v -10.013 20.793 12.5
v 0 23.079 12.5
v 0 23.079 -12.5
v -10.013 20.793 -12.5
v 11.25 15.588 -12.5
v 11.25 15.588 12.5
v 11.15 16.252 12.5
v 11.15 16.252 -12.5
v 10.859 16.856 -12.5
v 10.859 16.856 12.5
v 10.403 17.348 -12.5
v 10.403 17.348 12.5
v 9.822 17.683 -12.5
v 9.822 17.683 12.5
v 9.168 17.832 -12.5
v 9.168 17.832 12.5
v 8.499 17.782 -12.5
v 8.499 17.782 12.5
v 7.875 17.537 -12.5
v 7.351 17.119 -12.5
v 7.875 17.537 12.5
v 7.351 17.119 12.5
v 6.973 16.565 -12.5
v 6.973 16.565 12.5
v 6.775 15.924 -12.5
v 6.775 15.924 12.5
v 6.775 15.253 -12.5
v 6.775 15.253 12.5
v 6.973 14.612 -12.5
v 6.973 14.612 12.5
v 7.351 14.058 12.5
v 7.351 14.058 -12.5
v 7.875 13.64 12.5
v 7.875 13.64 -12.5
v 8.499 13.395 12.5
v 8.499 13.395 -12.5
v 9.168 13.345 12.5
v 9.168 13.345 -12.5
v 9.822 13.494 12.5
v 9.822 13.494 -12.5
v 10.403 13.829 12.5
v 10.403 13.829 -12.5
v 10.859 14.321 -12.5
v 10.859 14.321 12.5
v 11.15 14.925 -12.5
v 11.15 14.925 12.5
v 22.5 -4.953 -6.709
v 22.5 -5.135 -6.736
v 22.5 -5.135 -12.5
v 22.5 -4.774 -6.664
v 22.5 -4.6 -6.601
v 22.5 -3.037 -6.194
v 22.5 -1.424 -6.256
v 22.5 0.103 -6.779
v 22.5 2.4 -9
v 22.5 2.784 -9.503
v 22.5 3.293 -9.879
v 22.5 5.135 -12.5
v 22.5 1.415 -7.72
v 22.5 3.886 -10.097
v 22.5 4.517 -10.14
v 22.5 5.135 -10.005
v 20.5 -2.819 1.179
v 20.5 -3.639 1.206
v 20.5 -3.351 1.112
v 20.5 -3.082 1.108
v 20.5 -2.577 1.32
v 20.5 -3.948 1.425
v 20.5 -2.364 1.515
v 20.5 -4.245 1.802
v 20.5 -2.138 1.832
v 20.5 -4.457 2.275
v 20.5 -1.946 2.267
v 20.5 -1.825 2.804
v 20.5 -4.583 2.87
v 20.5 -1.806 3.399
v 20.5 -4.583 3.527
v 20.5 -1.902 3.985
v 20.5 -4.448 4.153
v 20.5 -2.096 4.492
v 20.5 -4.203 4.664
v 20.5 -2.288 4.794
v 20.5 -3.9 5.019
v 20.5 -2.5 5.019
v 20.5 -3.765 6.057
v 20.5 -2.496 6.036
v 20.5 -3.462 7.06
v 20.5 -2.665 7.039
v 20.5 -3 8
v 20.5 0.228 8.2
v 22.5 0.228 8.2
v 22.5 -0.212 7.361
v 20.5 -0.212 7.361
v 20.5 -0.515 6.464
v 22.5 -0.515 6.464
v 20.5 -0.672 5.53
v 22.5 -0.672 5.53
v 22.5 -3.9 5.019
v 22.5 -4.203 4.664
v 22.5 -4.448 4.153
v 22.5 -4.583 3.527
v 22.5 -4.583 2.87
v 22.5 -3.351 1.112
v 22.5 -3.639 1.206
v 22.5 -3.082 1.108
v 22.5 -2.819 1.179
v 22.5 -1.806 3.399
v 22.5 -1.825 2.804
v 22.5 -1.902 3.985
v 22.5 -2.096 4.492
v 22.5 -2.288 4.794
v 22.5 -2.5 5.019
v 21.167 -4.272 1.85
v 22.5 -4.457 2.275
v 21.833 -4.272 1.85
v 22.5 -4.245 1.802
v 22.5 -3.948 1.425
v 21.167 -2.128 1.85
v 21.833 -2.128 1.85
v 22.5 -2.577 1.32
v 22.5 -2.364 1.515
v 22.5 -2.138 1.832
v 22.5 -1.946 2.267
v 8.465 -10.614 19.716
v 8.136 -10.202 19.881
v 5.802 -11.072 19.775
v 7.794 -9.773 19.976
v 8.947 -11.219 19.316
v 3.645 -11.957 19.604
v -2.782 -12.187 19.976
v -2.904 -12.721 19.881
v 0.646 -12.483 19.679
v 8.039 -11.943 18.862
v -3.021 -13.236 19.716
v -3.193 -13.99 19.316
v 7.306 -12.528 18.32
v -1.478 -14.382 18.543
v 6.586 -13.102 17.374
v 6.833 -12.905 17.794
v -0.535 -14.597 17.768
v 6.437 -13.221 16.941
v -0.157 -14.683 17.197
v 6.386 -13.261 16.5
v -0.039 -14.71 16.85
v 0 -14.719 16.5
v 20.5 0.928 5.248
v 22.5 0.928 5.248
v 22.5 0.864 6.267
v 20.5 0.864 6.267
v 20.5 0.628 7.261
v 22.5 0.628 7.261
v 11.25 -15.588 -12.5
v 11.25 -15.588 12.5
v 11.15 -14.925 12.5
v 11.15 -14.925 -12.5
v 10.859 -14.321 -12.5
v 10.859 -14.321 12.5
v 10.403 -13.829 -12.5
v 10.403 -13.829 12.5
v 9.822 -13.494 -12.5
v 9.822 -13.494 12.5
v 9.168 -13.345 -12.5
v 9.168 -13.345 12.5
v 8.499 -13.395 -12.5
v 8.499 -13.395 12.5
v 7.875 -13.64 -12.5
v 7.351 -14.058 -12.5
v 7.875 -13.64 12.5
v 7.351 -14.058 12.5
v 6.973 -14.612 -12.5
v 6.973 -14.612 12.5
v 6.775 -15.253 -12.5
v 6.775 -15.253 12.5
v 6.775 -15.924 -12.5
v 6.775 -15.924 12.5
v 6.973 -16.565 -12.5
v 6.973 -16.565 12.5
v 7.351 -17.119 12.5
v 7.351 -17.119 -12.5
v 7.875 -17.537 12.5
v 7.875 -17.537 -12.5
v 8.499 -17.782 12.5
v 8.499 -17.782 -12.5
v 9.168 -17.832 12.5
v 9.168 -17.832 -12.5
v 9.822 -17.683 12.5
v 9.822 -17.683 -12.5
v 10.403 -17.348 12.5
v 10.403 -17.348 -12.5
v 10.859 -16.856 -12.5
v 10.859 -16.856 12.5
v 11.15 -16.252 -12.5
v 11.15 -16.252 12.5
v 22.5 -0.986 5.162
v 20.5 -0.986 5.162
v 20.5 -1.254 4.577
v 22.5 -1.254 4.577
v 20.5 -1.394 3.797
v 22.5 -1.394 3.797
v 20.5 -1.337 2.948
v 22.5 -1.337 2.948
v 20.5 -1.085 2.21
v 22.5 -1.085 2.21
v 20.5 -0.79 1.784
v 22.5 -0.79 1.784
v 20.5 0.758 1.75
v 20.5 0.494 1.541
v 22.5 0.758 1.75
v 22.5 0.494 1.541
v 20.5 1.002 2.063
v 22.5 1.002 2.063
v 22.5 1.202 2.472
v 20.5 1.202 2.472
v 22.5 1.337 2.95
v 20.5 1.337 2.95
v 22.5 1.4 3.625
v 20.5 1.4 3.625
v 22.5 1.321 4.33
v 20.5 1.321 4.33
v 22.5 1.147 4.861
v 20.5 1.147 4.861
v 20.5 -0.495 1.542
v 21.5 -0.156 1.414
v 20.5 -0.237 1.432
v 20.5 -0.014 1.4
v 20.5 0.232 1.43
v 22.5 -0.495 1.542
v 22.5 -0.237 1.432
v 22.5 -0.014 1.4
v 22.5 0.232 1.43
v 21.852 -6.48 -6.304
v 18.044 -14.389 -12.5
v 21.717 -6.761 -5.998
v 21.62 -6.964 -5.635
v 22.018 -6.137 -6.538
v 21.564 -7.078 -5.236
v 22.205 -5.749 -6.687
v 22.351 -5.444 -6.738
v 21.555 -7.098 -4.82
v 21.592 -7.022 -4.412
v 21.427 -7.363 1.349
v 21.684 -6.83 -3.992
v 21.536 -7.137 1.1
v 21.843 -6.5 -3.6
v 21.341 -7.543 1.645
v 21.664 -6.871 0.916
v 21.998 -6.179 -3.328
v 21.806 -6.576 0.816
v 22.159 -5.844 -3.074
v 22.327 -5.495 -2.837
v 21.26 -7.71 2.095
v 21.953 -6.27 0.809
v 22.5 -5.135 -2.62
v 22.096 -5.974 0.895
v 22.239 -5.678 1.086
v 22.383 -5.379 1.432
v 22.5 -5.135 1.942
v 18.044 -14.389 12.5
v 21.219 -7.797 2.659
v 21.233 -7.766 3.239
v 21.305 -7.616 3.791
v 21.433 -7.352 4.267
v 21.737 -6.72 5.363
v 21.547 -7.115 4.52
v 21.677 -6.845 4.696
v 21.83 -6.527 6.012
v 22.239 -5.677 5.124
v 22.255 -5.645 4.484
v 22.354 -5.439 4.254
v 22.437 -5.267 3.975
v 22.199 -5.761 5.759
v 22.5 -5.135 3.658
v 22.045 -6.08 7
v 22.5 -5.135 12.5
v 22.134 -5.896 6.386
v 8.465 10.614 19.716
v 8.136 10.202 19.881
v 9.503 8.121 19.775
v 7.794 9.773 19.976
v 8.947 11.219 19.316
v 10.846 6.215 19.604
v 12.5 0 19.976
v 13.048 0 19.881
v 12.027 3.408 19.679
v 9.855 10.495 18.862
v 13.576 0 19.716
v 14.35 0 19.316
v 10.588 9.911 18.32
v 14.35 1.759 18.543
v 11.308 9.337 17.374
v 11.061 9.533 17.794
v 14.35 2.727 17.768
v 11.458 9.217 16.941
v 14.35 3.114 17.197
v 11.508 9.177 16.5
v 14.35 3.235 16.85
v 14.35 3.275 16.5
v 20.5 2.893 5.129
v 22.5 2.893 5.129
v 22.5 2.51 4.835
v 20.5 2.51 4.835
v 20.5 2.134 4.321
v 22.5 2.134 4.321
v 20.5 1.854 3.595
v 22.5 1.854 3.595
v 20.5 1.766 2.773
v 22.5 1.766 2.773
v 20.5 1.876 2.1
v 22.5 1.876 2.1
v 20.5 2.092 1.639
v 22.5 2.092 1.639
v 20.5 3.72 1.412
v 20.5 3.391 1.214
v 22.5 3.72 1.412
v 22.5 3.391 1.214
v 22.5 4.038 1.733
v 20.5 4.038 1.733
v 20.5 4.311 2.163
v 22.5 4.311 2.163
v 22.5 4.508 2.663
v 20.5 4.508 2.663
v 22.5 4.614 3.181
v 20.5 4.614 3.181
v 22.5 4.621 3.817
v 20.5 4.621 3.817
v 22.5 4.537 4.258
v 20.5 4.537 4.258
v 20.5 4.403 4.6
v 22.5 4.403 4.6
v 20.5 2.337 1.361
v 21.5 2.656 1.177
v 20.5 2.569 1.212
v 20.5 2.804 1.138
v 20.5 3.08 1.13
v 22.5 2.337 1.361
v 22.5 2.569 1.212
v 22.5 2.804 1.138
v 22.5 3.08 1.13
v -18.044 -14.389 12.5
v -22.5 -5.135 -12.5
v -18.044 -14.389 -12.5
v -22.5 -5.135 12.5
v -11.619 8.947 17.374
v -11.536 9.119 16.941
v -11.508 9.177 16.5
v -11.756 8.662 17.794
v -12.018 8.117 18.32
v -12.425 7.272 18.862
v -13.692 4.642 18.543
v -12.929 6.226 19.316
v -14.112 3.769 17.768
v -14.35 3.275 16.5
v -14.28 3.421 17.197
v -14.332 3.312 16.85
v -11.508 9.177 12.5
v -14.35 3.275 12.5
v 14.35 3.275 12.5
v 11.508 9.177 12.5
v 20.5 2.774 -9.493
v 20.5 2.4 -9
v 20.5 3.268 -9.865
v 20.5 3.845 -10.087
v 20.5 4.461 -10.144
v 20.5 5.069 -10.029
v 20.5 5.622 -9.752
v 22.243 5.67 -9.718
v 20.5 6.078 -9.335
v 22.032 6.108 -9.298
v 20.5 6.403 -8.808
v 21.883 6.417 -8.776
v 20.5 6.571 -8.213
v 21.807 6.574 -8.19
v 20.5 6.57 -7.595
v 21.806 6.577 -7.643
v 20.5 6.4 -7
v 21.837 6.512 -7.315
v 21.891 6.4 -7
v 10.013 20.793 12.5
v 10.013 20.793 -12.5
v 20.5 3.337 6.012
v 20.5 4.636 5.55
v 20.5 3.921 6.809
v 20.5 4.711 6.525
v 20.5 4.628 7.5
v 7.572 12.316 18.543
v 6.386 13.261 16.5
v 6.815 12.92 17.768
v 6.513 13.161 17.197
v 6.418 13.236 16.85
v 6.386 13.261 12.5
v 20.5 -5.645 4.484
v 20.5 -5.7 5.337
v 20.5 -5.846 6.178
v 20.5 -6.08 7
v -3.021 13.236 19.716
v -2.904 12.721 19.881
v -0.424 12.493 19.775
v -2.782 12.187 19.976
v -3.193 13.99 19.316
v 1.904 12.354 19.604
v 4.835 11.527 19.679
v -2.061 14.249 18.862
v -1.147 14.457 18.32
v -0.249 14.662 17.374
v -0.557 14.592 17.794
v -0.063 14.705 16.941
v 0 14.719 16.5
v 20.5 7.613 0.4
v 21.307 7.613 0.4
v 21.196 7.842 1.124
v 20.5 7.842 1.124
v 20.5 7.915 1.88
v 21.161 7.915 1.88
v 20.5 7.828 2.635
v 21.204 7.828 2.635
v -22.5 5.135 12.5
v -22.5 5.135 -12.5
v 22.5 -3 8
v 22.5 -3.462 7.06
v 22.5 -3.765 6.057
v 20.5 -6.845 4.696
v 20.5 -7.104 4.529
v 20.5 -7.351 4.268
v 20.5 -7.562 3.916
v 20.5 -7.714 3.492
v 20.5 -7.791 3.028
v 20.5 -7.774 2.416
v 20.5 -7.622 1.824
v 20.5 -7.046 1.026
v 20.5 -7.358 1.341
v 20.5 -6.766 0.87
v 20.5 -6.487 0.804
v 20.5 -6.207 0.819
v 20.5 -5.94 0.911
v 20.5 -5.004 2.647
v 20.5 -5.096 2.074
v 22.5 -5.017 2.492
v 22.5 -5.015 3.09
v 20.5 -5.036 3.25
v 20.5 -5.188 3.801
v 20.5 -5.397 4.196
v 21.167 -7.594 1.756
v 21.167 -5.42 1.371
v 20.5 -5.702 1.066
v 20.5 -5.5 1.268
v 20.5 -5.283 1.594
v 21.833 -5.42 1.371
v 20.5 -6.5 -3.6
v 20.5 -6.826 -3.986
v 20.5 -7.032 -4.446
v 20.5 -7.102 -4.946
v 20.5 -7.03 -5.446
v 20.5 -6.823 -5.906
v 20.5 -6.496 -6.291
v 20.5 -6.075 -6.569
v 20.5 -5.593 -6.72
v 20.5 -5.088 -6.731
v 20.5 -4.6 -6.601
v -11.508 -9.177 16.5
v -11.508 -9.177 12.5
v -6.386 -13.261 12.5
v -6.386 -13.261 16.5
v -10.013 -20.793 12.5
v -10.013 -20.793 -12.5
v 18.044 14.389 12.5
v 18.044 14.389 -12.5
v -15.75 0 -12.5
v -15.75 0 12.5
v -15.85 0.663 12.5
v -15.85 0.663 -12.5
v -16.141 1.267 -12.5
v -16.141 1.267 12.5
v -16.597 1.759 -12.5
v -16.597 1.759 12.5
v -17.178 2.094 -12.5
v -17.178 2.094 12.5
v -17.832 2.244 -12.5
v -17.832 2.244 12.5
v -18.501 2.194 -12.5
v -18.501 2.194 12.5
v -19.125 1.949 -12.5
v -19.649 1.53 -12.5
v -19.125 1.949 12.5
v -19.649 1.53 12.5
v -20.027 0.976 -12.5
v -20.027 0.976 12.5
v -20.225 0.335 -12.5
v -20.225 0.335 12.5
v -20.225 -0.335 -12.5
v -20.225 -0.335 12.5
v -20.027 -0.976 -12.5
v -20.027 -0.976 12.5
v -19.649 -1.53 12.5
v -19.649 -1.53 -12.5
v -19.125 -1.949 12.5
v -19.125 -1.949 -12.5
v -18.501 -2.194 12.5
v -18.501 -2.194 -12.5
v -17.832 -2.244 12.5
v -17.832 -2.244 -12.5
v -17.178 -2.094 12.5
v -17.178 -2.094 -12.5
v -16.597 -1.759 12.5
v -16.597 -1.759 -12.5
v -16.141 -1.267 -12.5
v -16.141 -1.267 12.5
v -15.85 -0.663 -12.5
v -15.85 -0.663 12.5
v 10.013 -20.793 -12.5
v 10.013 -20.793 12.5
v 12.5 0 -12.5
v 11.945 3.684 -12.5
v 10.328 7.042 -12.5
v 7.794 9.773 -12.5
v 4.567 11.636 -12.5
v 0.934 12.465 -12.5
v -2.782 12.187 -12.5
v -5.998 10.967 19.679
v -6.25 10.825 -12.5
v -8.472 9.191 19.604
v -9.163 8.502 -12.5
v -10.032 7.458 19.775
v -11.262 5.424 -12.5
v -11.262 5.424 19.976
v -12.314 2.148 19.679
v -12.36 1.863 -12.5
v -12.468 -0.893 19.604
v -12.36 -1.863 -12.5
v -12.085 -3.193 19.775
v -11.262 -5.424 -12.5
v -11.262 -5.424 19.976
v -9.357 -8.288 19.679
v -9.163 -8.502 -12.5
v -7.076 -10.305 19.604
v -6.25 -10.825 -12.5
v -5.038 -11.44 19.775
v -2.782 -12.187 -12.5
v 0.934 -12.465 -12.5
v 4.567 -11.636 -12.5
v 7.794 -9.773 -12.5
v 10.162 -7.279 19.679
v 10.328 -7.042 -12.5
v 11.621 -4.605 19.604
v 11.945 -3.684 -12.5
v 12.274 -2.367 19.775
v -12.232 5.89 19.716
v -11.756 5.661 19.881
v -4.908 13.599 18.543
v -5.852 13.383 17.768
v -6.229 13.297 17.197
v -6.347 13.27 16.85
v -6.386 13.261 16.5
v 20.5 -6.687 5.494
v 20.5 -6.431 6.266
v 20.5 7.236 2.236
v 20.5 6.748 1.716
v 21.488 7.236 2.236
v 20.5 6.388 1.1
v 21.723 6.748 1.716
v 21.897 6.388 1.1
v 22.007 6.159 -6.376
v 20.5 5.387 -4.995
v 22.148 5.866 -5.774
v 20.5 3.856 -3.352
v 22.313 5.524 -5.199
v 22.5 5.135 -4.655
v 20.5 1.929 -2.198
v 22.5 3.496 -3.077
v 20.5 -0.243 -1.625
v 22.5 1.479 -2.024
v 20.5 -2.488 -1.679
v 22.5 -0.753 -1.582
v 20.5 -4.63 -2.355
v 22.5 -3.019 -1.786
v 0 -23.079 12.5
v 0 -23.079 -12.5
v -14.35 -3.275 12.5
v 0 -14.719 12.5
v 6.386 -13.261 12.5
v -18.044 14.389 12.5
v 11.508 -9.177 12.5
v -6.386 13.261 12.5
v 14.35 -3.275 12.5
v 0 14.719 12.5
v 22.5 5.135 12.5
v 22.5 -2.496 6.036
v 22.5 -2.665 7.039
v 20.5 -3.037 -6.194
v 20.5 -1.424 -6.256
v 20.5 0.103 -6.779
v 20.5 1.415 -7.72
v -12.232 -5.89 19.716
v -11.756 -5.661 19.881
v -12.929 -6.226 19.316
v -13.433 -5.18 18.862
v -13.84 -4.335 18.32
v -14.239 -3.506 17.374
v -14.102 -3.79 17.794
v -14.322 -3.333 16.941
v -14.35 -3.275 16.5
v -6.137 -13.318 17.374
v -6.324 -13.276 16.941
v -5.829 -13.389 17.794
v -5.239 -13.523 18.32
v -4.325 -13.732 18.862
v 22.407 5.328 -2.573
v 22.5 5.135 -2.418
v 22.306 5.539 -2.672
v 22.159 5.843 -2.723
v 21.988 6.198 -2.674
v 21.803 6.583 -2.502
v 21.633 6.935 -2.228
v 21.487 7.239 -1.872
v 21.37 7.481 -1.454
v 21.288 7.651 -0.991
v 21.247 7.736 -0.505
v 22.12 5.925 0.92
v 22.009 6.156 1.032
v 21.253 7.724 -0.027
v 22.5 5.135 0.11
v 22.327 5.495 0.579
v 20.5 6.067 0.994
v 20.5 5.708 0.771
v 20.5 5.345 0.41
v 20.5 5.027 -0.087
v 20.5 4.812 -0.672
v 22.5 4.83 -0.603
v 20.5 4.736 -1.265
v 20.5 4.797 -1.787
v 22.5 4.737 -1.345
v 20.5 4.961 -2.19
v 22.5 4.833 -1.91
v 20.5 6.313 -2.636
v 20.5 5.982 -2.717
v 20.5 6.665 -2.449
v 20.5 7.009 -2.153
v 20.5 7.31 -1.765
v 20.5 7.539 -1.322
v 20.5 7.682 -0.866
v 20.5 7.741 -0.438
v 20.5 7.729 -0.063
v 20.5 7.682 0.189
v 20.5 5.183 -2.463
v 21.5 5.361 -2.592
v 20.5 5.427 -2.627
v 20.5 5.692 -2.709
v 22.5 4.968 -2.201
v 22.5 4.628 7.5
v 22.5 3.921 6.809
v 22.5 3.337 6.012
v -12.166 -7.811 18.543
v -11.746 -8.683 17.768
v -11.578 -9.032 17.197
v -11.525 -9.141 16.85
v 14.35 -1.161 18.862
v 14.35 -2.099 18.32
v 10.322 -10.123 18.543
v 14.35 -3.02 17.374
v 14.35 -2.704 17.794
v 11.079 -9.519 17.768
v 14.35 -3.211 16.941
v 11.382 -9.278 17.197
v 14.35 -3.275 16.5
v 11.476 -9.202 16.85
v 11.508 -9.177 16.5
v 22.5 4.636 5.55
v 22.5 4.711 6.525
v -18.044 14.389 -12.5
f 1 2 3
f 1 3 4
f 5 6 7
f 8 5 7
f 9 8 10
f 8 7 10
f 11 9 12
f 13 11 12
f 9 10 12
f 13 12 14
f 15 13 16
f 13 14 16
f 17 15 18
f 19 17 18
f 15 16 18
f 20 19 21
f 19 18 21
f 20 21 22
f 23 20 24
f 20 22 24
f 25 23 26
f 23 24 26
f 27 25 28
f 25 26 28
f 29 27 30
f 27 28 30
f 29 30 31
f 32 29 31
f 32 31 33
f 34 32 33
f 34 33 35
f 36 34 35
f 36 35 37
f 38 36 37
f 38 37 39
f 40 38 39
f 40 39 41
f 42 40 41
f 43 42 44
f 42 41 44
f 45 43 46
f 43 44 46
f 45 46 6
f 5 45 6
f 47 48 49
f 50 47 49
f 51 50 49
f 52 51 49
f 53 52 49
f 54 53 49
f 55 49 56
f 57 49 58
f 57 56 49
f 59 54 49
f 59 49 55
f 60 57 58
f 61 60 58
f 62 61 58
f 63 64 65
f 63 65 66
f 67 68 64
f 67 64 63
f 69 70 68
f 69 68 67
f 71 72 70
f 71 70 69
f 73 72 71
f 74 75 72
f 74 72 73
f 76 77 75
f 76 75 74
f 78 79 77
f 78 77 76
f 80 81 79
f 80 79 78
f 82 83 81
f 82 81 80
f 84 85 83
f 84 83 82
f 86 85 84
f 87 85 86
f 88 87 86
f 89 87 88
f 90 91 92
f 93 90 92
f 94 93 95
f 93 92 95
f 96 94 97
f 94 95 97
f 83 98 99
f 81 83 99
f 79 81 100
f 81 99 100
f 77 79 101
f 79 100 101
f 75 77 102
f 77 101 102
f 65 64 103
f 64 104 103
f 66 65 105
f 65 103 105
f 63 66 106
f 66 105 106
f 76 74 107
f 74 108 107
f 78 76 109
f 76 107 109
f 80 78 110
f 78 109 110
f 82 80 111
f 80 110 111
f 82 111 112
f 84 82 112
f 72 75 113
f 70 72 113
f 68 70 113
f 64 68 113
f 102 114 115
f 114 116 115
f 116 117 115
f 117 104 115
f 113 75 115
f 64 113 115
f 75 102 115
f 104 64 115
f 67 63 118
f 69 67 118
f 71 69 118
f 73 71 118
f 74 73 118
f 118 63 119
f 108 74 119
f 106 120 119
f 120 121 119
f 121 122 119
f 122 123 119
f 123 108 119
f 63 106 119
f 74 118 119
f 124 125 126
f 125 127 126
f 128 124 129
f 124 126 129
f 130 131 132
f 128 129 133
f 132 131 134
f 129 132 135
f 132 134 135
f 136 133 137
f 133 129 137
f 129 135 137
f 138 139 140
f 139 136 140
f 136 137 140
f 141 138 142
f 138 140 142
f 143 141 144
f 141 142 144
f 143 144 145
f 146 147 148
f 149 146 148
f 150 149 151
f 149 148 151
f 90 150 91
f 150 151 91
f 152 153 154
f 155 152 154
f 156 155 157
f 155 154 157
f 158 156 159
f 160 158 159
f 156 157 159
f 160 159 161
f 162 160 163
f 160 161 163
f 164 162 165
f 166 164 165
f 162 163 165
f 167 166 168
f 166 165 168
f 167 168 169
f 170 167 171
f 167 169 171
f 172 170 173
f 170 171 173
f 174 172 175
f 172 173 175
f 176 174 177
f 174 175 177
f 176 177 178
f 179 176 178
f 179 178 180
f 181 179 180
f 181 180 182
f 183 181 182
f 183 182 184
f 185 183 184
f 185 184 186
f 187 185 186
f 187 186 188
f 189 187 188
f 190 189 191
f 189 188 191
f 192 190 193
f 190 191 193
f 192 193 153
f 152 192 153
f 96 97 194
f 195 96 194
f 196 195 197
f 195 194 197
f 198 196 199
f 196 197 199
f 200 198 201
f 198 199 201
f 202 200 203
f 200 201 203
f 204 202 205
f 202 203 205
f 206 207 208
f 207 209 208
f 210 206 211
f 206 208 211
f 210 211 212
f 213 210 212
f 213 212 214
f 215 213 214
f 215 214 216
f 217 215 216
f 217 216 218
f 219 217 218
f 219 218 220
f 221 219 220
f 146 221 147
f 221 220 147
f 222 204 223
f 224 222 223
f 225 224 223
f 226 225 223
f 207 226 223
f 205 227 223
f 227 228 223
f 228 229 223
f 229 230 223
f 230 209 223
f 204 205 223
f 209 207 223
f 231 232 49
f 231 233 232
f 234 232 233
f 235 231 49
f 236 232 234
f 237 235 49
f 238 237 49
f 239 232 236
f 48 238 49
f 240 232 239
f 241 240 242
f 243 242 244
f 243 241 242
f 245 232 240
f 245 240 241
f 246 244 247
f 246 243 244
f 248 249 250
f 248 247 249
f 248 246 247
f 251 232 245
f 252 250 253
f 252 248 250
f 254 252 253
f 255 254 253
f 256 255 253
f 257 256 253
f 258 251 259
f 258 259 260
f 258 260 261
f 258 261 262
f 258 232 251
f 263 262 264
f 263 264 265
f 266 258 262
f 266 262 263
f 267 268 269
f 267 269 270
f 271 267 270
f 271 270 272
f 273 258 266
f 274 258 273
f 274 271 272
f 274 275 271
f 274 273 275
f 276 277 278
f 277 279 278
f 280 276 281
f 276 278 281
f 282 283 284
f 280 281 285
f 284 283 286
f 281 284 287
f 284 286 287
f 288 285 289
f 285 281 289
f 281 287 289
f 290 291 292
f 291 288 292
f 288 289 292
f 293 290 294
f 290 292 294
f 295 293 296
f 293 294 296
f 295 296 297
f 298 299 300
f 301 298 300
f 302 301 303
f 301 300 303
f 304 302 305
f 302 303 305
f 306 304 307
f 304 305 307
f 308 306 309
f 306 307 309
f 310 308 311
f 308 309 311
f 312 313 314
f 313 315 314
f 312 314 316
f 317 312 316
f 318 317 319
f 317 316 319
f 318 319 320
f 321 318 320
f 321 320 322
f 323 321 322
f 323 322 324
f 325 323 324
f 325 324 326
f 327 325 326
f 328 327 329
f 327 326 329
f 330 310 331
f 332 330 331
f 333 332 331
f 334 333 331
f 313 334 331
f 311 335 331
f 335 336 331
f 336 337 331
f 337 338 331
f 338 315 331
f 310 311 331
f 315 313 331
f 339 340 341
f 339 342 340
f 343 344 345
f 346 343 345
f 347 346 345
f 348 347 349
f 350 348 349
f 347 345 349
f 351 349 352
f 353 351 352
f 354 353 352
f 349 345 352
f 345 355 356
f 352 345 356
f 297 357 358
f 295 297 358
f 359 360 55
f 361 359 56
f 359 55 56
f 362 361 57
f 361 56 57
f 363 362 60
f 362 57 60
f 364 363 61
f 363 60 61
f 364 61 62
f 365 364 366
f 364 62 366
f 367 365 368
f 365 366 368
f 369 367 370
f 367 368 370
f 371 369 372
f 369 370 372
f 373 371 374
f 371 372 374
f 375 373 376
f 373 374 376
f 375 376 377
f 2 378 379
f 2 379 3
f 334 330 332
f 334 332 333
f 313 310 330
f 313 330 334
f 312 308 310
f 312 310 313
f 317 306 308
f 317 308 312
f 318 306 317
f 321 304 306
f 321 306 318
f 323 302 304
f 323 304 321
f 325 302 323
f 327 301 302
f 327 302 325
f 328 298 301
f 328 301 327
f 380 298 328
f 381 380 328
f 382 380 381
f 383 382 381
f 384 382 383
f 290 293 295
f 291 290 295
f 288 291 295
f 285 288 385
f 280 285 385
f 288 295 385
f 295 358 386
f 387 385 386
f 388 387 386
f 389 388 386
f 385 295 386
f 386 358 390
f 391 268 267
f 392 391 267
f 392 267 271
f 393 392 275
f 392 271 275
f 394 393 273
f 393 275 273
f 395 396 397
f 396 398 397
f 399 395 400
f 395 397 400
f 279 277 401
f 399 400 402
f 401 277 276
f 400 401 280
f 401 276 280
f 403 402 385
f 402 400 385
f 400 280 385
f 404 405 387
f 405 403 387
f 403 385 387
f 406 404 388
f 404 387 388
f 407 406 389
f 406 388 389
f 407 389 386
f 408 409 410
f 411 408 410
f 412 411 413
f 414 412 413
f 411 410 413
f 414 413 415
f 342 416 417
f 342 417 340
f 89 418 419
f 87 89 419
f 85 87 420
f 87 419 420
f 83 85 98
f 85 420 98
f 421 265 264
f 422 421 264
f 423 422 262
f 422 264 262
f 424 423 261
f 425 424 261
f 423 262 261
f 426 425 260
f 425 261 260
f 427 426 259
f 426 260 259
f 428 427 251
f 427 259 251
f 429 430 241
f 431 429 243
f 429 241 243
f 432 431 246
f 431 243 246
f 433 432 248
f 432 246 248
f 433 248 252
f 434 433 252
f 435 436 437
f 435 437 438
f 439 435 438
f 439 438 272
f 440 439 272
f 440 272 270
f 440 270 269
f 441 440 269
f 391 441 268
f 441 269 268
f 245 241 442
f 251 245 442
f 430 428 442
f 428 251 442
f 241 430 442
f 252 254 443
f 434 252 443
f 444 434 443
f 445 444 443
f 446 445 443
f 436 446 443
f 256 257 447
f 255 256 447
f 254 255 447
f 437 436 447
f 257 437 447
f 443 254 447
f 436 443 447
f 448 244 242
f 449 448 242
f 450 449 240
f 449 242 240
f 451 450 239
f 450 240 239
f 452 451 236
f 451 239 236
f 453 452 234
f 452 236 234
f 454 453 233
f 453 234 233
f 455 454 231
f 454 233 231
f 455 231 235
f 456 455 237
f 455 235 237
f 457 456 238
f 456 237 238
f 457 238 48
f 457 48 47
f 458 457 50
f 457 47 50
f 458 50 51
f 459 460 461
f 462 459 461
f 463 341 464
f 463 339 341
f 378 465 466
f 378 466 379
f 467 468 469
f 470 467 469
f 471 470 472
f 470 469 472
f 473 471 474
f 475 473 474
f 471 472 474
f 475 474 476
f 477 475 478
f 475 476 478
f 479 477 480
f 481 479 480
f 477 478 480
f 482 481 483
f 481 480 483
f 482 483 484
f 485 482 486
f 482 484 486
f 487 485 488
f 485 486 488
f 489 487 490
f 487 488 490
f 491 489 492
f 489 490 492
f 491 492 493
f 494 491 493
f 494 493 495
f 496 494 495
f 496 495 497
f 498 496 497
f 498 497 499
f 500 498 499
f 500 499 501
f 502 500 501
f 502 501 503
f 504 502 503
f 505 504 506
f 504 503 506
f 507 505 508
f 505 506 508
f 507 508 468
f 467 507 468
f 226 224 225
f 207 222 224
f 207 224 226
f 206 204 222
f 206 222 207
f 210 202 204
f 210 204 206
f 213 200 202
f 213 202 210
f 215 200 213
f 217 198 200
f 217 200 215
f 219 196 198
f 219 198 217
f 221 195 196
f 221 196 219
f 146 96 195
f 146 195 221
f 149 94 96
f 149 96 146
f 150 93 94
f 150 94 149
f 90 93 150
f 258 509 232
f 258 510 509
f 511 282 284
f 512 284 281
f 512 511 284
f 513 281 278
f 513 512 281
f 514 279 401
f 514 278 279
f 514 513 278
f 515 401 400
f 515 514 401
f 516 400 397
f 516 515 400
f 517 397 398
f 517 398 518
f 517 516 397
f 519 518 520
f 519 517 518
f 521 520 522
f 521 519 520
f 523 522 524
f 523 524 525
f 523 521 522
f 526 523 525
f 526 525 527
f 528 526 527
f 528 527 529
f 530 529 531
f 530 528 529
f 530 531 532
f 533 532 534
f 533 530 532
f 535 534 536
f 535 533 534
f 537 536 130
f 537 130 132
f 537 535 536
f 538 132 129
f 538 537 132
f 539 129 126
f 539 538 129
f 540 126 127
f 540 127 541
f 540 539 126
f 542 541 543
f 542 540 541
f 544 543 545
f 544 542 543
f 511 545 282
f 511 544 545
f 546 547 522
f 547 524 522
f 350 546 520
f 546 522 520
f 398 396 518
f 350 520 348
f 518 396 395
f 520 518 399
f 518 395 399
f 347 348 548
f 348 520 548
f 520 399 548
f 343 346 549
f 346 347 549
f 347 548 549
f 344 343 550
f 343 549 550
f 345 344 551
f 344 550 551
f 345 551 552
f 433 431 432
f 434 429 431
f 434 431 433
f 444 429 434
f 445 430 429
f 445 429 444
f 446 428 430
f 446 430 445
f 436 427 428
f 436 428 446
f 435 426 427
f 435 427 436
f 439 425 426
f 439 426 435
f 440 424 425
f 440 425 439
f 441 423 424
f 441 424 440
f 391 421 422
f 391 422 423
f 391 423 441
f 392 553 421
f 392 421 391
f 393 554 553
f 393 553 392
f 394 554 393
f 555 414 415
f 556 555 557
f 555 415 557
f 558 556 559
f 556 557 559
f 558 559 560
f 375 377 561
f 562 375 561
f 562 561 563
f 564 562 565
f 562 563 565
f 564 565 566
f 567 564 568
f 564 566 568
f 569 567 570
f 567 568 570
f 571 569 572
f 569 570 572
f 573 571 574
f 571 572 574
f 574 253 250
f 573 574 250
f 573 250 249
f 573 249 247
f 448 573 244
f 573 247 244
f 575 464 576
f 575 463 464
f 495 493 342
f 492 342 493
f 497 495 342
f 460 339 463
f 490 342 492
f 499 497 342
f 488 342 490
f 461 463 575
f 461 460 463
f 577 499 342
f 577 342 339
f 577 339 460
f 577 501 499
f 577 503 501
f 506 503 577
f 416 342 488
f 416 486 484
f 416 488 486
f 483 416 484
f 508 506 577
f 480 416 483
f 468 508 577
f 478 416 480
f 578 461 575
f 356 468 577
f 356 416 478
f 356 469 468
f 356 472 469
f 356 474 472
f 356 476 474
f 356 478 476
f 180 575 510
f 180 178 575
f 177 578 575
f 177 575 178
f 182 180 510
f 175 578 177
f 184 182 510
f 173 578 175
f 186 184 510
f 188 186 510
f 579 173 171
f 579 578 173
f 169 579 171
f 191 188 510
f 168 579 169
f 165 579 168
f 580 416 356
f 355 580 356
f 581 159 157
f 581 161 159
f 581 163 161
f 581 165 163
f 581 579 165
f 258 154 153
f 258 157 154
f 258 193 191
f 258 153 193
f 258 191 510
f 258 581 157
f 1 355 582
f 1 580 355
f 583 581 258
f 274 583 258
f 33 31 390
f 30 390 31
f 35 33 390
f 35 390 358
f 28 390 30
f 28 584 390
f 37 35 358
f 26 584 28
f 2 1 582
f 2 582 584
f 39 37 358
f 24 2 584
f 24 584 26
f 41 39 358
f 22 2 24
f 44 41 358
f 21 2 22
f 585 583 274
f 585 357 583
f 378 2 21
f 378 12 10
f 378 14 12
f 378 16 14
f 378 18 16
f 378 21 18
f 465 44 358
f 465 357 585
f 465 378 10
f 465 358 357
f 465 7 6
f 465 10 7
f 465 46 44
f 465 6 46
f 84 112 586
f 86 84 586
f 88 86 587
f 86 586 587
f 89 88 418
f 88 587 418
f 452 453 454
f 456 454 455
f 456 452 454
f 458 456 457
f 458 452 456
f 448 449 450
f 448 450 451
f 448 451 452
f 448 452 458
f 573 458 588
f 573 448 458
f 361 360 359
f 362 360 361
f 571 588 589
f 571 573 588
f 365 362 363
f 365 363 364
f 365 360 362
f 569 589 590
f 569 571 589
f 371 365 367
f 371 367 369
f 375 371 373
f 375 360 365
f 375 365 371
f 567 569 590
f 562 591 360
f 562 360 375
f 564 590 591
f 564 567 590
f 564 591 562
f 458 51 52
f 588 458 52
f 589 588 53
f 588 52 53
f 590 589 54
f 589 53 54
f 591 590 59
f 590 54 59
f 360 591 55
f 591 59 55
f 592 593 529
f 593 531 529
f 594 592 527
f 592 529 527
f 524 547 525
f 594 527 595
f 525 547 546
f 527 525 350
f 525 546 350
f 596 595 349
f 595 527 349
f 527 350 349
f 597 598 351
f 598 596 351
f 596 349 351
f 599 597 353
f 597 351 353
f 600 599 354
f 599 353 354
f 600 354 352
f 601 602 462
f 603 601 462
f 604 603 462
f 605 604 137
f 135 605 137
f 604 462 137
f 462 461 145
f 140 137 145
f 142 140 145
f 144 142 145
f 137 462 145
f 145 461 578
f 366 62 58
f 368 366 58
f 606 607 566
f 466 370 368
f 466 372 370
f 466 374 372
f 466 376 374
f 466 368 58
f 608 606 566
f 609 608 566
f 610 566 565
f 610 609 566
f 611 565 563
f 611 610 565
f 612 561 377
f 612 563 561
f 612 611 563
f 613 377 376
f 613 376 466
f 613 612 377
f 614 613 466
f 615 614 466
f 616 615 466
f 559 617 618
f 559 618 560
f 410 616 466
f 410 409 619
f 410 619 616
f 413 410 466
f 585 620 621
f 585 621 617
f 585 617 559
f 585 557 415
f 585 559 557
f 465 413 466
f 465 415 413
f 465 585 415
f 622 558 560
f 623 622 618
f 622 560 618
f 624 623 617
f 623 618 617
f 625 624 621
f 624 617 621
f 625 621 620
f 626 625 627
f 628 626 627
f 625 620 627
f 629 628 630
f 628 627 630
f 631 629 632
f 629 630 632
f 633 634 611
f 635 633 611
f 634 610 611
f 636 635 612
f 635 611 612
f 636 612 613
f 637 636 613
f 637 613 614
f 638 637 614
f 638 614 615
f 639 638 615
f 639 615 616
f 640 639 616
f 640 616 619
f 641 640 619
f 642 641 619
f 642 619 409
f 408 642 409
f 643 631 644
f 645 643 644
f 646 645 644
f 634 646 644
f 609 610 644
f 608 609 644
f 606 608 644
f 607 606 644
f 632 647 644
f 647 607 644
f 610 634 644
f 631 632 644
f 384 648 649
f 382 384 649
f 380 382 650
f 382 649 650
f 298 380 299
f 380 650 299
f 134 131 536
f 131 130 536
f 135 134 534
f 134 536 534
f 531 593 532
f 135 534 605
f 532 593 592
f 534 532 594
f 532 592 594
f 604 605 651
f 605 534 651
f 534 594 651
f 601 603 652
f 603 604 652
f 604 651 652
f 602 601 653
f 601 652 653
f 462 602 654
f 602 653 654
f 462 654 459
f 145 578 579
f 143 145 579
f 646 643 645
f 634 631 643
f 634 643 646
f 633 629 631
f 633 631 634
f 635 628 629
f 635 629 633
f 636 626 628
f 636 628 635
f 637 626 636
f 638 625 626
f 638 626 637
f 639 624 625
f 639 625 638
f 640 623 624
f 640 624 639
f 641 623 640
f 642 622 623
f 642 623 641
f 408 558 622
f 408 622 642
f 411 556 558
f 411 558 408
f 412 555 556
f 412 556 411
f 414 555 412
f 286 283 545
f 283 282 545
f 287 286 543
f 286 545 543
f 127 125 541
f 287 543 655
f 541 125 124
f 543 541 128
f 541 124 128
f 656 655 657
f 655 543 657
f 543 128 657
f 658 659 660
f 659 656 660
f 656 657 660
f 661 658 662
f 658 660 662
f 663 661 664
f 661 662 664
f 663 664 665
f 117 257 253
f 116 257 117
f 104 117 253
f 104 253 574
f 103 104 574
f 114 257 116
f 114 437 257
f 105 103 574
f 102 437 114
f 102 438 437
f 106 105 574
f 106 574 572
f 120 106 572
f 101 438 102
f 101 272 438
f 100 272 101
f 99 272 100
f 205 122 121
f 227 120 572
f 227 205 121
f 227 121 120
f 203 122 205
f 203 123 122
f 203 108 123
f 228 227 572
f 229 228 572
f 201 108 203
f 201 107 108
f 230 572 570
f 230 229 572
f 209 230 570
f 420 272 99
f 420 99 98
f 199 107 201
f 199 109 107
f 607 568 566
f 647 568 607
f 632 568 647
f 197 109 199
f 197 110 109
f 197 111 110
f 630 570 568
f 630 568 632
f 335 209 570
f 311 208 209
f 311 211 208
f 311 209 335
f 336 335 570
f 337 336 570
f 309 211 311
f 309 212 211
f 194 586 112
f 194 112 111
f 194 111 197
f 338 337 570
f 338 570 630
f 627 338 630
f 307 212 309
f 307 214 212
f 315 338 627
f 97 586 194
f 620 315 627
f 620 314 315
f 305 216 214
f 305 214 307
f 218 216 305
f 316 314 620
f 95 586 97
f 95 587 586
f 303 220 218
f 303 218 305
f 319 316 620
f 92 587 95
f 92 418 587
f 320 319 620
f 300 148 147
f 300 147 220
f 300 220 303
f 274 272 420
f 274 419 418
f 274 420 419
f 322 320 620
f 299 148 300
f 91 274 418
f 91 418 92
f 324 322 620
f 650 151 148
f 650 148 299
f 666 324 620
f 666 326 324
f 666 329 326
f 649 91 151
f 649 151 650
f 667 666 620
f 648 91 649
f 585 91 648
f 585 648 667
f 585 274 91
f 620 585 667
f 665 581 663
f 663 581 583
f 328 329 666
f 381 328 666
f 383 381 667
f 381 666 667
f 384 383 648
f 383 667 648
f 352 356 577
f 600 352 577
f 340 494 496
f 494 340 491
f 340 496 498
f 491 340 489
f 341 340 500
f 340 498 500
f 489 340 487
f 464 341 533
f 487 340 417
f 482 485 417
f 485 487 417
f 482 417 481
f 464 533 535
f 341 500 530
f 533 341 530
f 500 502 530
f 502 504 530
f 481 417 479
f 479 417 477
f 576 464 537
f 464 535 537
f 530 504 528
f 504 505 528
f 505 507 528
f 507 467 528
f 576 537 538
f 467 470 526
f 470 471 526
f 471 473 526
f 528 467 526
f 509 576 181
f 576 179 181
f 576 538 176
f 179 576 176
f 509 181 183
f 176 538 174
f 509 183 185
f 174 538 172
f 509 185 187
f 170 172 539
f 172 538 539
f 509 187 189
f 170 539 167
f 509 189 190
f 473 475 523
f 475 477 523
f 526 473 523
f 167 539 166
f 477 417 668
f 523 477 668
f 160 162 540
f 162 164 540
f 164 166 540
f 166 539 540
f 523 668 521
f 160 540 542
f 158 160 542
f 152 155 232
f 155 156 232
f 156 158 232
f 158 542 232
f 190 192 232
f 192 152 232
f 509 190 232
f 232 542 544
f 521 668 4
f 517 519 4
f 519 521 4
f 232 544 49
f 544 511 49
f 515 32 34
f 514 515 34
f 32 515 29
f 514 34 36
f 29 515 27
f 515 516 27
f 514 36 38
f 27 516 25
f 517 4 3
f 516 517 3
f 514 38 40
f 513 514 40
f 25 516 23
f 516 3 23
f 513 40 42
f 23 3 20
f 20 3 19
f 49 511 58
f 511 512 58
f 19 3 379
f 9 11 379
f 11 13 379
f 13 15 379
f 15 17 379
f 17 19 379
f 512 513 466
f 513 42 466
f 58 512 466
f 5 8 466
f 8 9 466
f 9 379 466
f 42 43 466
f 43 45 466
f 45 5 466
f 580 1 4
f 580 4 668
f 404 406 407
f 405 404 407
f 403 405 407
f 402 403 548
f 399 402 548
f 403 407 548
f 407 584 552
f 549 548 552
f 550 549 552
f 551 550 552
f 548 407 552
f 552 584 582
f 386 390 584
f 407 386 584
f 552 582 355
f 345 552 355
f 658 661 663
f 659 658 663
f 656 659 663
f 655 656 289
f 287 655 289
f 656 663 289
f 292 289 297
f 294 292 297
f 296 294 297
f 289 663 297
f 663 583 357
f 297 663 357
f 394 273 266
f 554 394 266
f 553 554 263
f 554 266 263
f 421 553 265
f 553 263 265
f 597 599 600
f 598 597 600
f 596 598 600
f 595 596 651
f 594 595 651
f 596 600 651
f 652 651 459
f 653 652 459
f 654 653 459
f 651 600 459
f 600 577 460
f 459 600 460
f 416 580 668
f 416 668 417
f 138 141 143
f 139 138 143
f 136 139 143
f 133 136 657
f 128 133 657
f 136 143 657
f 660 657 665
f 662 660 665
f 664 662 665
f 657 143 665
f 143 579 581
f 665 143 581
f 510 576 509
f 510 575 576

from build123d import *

# Parameters (mm, degrees)
F0_R         = 12.5
F1_DEPTH     = 12.5
F2_R         = 2.25
F3_DEPTH     = 25
F4_R         = 12.5
F5_DEPTH     = 7.5
F6_T1_DEPTH  = 24.050587715
F6_T3_DEPTH  = 24.050587715
F6_T5_DEPTH  = 24.050587715
F6_T7_DEPTH  = 24.050587715
F6_T9_DEPTH  = 24.050587715
F6_T11_DEPTH = 24.050587715
F6_T13_DEPTH = 24.050587715
F8_DEPTH     = 2


# Not quite as in the source:
# - a fillet or chamfer that OpenCascade refuses, or shapes differently, is made with other operations: its cross-section is extruded or revolved along the edge and cut away or added


with BuildPart() as f1:
    # F0 (on Top) → F1 (new body, symmetric)
    with BuildSketch(Plane.XY):
        Polygon((22.5, -5.1354781738), (22.5, 5.1354781738), (18.0435990556, 14.3892900865), (10.013442028, 20.7931266245), (0, 23.0786294236), (-10.013442028, 20.7931266245), (-18.0435990556, 14.3892900865), (-22.5, 5.1354781738), (-22.5, -5.1354781738), (-18.0435990556, -14.3892900865), (-10.013442028, -20.7931266245), (0, -23.0786294236), (10.013442028, -20.7931266245), (18.0435990556, -14.3892900865), align=None)
        Circle(F0_R, mode=Mode.SUBTRACT)
    extrude(amount=F1_DEPTH, both=True)

    # F2 (on face) → F3 (cut)
    with BuildSketch(Plane.XY.offset(12.5)):
        with Locations((9, 15.5884572681)):
            Circle(F2_R)
        with Locations((-18, 0)):
            Circle(F2_R)
        with Locations((9, -15.5884572681)):
            Circle(F2_R)
    extrude(amount=-F3_DEPTH, mode=Mode.SUBTRACT)

    # F4 (on face) → F5 (join)
    with BuildSketch(Plane.XY.offset(12.5)):
        Polygon((14.35, -3.2752938575), (14.35, 3.2752938575), (11.5078065088, 9.1771694552), (6.3863508045, 13.2613940917), (0, 14.719036988), (-6.3863508045, 13.2613940917), (-11.5078065088, 9.1771694552), (-14.35, 3.2752938575), (-14.35, -3.2752938575), (-11.5078065088, -9.1771694552), (-6.3863508045, -13.2613940917), (0, -14.719036988), (6.3863508045, -13.2613940917), (11.5078065088, -9.1771694552), align=None)
        Circle(F4_R, mode=Mode.SUBTRACT)
    extrude(amount=F5_DEPTH)

    # F6: fillet of radius 3.5 on 7 edges, made by hand

    # F6_s2 → F6_t1 (cut)
    with BuildSketch(Plane.XZ.offset(-12.0252938575)):
        with BuildLine():
            ThreePointArc((-10.85, 20), (-13.3248737342, 18.9748737342), (-14.35, 16.5))
            Line((-14.35, 16.5), (-14.35, 20))
            Line((-14.35, 20), (-10.85, 20))
        make_face()
    extrude(amount=F6_T1_DEPTH, mode=Mode.SUBTRACT)

    # F6_s4 → F6_t3 (cut)
    with BuildSketch(Plane(origin=(-9.4017533237, 7.4976480845, 0), x_dir=(0, 0, 1), z_dir=(0.7818314825, -0.6234898019, 0))):
        with BuildLine():
            ThreePointArc((20, 10.85), (18.9748737342, 13.3248737342), (16.5, 14.35))
            Line((16.5, 14.35), (20, 14.35))
            Line((20, 14.35), (20, 10.85))
        make_face()
    extrude(amount=F6_T3_DEPTH, mode=Mode.SUBTRACT)

    # F6_s6 → F6_t5 (cut)
    with BuildSketch(Plane(origin=(-11.7237946339, -2.6758796203, 0), x_dir=(0, 0, 1), z_dir=(0.9749279122, 0.222520934, 0))):
        with BuildLine():
            ThreePointArc((20, 10.85), (18.9748737342, 13.3248737342), (16.5, 14.35))
            Line((16.5, 14.35), (20, 14.35))
            Line((20, 14.35), (20, 10.85))
        make_face()
    extrude(amount=F6_T5_DEPTH, mode=Mode.SUBTRACT)

    # F6_s8 → F6_t7 (cut)
    with BuildSketch(Plane(origin=(-5.2175794629, -10.834415393, 0), x_dir=(0, 0, 1), z_dir=(0.4338837391, 0.9009688679, 0))):
        with BuildLine():
            ThreePointArc((20, 10.85), (18.9748737342, 13.3248737342), (16.5, 14.35))
            Line((16.5, 14.35), (20, 14.35))
            Line((20, 14.35), (20, 10.85))
        make_face()
    extrude(amount=F6_T7_DEPTH, mode=Mode.SUBTRACT)

    # F6_s10 → F6_t9 (cut)
    with BuildSketch(Plane(origin=(5.2175794629, -10.834415393, 0), x_dir=(0, 0, 1), z_dir=(-0.4338837391, 0.9009688679, 0))):
        with BuildLine():
            ThreePointArc((20, 10.85), (18.9748737342, 13.3248737342), (16.5, 14.35))
            Line((16.5, 14.35), (20, 14.35))
            Line((20, 14.35), (20, 10.85))
        make_face()
    extrude(amount=F6_T9_DEPTH, mode=Mode.SUBTRACT)

    # F6_s12 → F6_t11 (cut)
    with BuildSketch(Plane(origin=(11.7237946339, -2.6758796203, 0), x_dir=(0, 0, 1), z_dir=(-0.9749279122, 0.222520934, 0))):
        with BuildLine():
            ThreePointArc((20, 10.85), (18.9748737342, 13.3248737342), (16.5, 14.35))
            Line((16.5, 14.35), (20, 14.35))
            Line((20, 14.35), (20, 10.85))
        make_face()
    extrude(amount=F6_T11_DEPTH, mode=Mode.SUBTRACT)

    # F6_s14 → F6_t13 (cut)
    with BuildSketch(Plane(origin=(9.4017533237, 7.4976480845, 0), x_dir=(0, 0, 1), z_dir=(-0.7818314825, -0.6234898019, 0))):
        with BuildLine():
            ThreePointArc((20, 10.85), (18.9748737342, 13.3248737342), (16.5, 14.35))
            Line((16.5, 14.35), (20, 14.35))
            Line((20, 14.35), (20, 10.85))
        make_face()
    extrude(amount=F6_T13_DEPTH, mode=Mode.SUBTRACT)

    # F7 (on face) → F8 (cut)
    with BuildSketch(Plane.YZ.offset(22.5)):
        with BuildLine():
            ThreePointArc((-6.08032713, 7), (-6.5709395266, 5.8842188275), (-6.8446164746, 4.6964608232))
            add(Edge.make_bspline(
                [(-6.8446164746, 4.6964608232), (-8.5118431653, 3.8987596156), (-7.5942066586, 1.756193723), (-6.676570152, -0.3863721695), (-5.4204160797, 1.3711319286), (-4.1642620074, 3.1286360267), (-5.6446164746, 4.4838947381)],
                knots=[3.4647722977, 3.4647722977, 3.4647722977, 5.2614695117, 5.2614695117, 7.0581667257, 7.0581667257, 8.8548639397, 8.8548639397, 8.8548639397], degree=2, weights=[1, 0.6229027007, 1, 0.6229027007, 1, 0.6229027007, 1]))
            ThreePointArc((-5.6446164746, 4.4838947381), (-5.761433535, 5.7594440336), (-6.08032713, 7))
        make_face()
        with BuildLine():
            ThreePointArc((-3, 8), (-3.6341058947, 6.5649040102), (-3.9, 5.0186533479))
            add(Edge.make_bspline(
                [(-3.9, 5.0186533479), (-5.3449244407, 3.7673120757), (-4.2724622204, 1.8501460197), (-3.2, -0.0670200364), (-2.1275377796, 1.8501460197), (-1.0550755593, 3.7673120757), (-2.5, 5.0186533479)],
                knots=[3.6651914292, 3.6651914292, 3.6651914292, 5.4105206812, 5.4105206812, 7.1558499332, 7.1558499332, 8.9011791852, 8.9011791852, 8.9011791852], degree=2, weights=[1, 0.6427876097, 1, 0.6427876097, 1, 0.6427876097, 1]))
            ThreePointArc((-2.5, 5.0186533479), (-2.5591609645, 6.5413321832), (-3, 8))
        make_face()
        with BuildLine():
            ThreePointArc((0.2275558291, 8.2), (-0.3814401497, 6.9183905981), (-0.6724441709, 5.5296086062))
            add(Edge.make_bspline(
                [(-0.6724441709, 5.5296086062), (-4.5551319088, 2.1883602337), (-0.1559076785, 1.4136843578), (4.2433165517, 0.6390084818), (0.9275558291, 5.247858612)],
                knots=[3.6426090527, 3.6426090527, 3.6426090527, 6.1715912058, 6.1715912058, 8.7005733589, 8.7005733589, 8.7005733589], degree=2, weights=[1, 0.301537928, 1, 0.301537928, 1]))
            ThreePointArc((0.9275558291, 5.247858612), (0.7672369702, 6.7689057422), (0.2275558291, 8.2))
        make_face()
        with BuildLine():
            ThreePointArc((4.6275558291, 7.5), (3.6127003085, 6.4223734822), (2.8925635541, 5.1290778105))
            add(Edge.make_bspline(
                [(2.8925635541, 5.1290778105), (-1.6007345704, 2.6680437483), (2.6559421174, 1.1765704347), (6.9126188052, -0.3149028789), (4.4025558291, 4.6)],
                knots=[3.6564949123, 3.6564949123, 3.6564949123, 6.1933168635, 6.1933168635, 8.7301388146, 8.7301388146, 8.7301388146], degree=2, weights=[1, 0.2977981768, 1, 0.2977981768, 1]))
            ThreePointArc((4.4025558291, 4.6), (4.6934507475, 6.036159015), (4.6275558291, 7.5))
        make_face()
        with BuildLine():
            ThreePointArc((7.8275558291, 2.635071483), (6.9777355341, 1.9893158846), (6.3875558291, 1.1))
            add(Edge.make_bspline(
                [(6.3875558291, 1.1), (0.8266327144, -0.0014683083), (5.3606005397, -2.5921173467), (9.8945683651, -5.182766385), (7.6126455386, 0.4)],
                knots=[3.5803471544, 3.5803471544, 3.5803471544, 6.1960920441, 6.1960920441, 8.8118369337, 8.8118369337, 8.8118369337], degree=2, weights=[1, 0.2599050592, 1, 0.2599050592, 1]))
            ThreePointArc((7.6126455386, 0.4), (7.89881342, 1.5003518589), (7.8275558291, 2.635071483))
        make_face()
        with BuildLine():
            ThreePointArc((2.4, -9), (5.354892815, -9.90978563), (6.4, -7))
            ThreePointArc((6.4, -7), (0.8632403752, -1.8350585765), (-6.5, -3.6))
            ThreePointArc((-6.5, -3.6), (-6.8228285121, -5.9063339911), (-4.6, -6.6009044571))
            ThreePointArc((-4.6, -6.6009044571), (-0.6410576804, -6.4613658189), (2.4, -9))
        make_face()
    extrude(amount=-F8_DEPTH, mode=Mode.SUBTRACT)


solid = f1.part
